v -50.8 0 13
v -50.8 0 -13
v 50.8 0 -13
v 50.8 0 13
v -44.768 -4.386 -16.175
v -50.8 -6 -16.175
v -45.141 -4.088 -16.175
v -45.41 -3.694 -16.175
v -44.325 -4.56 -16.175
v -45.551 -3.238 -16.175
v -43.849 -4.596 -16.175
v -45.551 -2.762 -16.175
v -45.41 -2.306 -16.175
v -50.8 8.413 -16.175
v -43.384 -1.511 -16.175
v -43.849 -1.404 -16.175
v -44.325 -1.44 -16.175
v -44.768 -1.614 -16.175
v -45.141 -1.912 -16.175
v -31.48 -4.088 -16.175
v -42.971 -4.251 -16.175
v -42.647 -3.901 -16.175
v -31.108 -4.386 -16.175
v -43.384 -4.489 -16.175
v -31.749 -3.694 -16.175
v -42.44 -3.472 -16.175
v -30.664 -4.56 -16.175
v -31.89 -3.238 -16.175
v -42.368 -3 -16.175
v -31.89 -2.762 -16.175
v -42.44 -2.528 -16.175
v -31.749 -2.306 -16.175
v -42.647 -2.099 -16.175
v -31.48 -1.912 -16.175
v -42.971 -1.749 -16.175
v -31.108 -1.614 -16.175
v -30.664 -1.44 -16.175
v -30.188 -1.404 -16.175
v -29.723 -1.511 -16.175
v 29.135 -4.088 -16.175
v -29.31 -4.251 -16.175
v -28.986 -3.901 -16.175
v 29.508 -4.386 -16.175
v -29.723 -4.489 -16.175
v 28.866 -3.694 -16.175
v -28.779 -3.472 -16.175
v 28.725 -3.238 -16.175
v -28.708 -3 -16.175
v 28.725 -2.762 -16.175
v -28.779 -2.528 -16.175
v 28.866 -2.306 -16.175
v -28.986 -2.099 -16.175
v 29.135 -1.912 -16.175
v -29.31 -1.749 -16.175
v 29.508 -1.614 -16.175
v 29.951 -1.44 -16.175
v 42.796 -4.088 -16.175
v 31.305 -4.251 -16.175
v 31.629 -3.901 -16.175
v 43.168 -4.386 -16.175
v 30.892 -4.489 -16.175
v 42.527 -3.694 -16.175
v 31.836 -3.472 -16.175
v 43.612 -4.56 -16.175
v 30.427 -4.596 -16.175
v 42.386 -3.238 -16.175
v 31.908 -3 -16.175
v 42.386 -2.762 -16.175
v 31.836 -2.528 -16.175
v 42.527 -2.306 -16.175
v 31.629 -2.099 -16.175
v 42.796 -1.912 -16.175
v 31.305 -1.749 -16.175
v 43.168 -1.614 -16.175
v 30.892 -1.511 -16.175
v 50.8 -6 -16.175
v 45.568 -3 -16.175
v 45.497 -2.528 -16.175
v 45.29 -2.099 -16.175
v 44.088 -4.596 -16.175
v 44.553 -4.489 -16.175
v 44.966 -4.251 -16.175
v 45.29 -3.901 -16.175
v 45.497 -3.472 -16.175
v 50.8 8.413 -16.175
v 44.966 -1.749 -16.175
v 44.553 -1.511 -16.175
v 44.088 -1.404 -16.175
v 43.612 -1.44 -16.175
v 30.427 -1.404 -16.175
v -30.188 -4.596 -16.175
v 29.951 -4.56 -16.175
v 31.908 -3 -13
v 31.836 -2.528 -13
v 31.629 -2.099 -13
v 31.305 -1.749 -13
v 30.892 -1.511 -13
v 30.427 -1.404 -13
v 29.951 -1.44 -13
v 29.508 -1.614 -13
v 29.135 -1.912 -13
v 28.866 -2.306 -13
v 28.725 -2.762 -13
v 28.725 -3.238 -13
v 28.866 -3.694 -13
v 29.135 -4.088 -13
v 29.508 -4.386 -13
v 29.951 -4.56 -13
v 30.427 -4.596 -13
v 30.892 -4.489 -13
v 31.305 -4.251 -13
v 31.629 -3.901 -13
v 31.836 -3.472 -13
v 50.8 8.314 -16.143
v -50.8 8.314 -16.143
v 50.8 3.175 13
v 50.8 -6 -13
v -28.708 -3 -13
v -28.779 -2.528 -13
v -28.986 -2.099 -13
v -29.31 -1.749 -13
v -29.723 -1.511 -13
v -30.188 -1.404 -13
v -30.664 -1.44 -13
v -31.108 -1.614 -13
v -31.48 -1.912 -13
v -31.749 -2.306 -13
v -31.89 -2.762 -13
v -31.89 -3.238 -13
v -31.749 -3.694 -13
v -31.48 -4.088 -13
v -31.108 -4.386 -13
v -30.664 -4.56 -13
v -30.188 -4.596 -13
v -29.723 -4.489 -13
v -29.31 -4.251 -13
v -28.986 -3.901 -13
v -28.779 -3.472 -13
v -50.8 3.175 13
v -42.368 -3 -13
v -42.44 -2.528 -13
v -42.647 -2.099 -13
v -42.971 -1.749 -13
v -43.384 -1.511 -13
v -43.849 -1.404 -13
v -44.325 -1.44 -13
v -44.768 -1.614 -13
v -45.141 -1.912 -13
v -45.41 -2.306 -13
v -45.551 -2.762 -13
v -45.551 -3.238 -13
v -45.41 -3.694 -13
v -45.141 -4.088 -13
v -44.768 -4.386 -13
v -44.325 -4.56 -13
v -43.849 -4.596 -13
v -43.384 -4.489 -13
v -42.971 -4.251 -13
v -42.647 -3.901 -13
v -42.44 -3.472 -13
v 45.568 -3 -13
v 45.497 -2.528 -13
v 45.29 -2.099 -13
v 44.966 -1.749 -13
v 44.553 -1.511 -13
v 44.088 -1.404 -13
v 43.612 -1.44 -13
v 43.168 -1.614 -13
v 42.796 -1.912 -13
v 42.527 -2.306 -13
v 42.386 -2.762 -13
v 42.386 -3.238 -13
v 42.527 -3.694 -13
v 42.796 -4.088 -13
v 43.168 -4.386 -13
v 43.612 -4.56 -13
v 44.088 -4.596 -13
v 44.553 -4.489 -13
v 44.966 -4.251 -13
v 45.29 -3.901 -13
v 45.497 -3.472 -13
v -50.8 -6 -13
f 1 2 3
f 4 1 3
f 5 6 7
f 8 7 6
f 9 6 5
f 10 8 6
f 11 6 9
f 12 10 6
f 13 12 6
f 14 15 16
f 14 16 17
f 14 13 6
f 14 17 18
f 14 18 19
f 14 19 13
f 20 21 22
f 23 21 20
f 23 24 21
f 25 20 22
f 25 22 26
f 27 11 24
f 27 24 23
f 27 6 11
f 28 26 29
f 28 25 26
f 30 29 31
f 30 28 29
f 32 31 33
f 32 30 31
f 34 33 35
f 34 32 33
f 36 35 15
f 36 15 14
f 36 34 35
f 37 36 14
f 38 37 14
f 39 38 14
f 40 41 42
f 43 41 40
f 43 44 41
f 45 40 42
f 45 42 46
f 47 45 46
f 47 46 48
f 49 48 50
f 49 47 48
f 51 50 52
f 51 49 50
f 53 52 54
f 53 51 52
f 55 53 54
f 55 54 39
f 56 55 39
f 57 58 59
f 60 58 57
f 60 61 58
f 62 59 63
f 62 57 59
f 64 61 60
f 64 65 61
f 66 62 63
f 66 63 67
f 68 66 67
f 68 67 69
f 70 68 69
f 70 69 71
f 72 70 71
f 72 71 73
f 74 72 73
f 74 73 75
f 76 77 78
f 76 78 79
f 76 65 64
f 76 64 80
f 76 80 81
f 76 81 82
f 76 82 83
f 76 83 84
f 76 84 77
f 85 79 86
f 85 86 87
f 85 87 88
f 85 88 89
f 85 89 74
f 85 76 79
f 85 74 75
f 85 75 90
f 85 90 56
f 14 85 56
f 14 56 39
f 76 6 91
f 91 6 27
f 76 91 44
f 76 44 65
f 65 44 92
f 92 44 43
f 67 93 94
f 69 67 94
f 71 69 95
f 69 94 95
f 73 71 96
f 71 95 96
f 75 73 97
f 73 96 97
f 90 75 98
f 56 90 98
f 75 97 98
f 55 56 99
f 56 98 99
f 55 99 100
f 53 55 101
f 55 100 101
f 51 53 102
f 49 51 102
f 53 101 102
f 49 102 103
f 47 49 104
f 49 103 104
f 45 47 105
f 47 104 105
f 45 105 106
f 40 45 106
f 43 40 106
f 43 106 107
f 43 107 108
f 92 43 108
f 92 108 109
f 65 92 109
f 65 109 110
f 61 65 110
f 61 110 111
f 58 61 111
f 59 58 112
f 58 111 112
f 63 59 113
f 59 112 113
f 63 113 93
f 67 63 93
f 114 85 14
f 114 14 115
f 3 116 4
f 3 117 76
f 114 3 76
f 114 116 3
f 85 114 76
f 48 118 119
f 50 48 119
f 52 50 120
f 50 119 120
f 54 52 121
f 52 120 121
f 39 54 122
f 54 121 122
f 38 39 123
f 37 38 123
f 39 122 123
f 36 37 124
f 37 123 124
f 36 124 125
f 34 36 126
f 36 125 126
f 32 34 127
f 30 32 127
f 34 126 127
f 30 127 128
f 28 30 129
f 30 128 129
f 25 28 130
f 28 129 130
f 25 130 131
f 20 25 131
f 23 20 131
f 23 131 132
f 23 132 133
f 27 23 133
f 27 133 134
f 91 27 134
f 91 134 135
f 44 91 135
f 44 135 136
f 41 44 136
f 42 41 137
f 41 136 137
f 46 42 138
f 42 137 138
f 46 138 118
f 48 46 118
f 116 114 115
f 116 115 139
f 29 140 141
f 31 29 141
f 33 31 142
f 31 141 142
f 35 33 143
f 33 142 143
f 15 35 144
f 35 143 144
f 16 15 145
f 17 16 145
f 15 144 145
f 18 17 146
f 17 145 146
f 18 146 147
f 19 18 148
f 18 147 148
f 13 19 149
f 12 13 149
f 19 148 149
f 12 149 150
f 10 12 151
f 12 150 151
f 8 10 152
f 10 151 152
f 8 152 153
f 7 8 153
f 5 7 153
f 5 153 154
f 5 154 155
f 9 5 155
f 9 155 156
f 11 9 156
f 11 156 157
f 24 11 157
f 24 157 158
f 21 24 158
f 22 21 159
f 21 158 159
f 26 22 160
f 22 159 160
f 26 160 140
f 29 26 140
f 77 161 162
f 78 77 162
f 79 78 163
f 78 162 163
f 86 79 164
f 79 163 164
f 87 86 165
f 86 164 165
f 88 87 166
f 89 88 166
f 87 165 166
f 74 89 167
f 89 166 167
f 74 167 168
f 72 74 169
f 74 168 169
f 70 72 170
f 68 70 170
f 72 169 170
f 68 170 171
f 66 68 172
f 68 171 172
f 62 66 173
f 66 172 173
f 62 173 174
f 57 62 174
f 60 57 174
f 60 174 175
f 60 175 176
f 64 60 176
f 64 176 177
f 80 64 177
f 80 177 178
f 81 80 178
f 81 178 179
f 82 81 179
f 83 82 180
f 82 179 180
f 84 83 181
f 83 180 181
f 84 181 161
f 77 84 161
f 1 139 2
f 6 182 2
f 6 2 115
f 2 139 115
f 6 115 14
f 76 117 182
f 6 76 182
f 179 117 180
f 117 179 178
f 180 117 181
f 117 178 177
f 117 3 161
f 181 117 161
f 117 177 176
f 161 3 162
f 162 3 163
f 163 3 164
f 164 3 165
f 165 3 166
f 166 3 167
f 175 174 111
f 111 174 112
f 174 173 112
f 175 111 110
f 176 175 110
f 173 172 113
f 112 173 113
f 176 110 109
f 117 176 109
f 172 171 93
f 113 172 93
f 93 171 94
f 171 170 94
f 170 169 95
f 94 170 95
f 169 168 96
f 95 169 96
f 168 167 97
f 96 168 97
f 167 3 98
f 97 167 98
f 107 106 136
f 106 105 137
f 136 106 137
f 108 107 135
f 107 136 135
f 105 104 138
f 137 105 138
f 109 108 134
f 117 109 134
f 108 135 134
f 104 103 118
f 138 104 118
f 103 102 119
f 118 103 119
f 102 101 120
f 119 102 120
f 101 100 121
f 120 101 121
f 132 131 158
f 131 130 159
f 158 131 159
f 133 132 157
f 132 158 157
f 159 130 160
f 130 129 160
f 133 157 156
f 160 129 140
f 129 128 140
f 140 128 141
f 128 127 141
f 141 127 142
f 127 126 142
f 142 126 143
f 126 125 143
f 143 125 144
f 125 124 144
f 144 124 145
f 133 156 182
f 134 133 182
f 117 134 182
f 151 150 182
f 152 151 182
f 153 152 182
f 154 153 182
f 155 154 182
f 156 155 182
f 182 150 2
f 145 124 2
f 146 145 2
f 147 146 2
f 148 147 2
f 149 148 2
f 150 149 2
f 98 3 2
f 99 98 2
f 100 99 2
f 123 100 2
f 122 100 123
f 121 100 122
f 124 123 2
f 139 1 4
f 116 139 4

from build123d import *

# Parameters (mm, degrees)
SKETCH1_W           = 101.6
SKETCH1_H           = 26
BOSS_EXTRUDE1_DEPTH = 3.175
SKETCH2_W           = 101.6
SKETCH2_H           = 9.175
BOSS_EXTRUDE2_DEPTH = 3.175
SKETCH3_R           = 1.6
CUT_EXTRUDE1_DEPTH  = 3.175
BOSS_EXTRUDE3_DEPTH = 101.6


with BuildPart() as part:
    # Sketch1 → Boss-Extrude1 (new body)
    with BuildSketch(Plane(origin=(0, 0, 0), x_dir=(1, 0, 0), z_dir=(0, 1, 0))):
        Rectangle(SKETCH1_W, SKETCH1_H)
    extrude(amount=BOSS_EXTRUDE1_DEPTH)

    # Sketch2 → Boss-Extrude2 (add)
    with BuildSketch(Plane(origin=(0, 0, -13), x_dir=(-1, 0, 0), z_dir=(0, 0, -1))):
        with Locations((0, -1.4125)):
            Rectangle(SKETCH2_W, SKETCH2_H)
    extrude(amount=BOSS_EXTRUDE2_DEPTH)

    # Sketch3 → Cut-Extrude1 (cut)
    with BuildSketch(Plane.XY.offset(-13)):
        with Locations((30.3075, -3)):
            Circle(SKETCH3_R)
        with Locations((-30.3075, -3)):
            Circle(SKETCH3_R)
        with Locations((43.9685, -3)):
            Circle(SKETCH3_R)
        with Locations((-43.9685, -3)):
            Circle(SKETCH3_R)
    extrude(amount=-CUT_EXTRUDE1_DEPTH, mode=Mode.SUBTRACT)

    # Sketch4 → Boss-Extrude3 (add)
    with BuildSketch(Plane(origin=(50.8, 0, 0), x_dir=(0, 0, -1), z_dir=(1, 0, 0))):
        Polygon((16.175, 3.175), (16.175, 8.412812241), (16.143192443, 8.313731132), (-13, 3.175), align=None)
    extrude(amount=-BOSS_EXTRUDE3_DEPTH)


solid = part.part
